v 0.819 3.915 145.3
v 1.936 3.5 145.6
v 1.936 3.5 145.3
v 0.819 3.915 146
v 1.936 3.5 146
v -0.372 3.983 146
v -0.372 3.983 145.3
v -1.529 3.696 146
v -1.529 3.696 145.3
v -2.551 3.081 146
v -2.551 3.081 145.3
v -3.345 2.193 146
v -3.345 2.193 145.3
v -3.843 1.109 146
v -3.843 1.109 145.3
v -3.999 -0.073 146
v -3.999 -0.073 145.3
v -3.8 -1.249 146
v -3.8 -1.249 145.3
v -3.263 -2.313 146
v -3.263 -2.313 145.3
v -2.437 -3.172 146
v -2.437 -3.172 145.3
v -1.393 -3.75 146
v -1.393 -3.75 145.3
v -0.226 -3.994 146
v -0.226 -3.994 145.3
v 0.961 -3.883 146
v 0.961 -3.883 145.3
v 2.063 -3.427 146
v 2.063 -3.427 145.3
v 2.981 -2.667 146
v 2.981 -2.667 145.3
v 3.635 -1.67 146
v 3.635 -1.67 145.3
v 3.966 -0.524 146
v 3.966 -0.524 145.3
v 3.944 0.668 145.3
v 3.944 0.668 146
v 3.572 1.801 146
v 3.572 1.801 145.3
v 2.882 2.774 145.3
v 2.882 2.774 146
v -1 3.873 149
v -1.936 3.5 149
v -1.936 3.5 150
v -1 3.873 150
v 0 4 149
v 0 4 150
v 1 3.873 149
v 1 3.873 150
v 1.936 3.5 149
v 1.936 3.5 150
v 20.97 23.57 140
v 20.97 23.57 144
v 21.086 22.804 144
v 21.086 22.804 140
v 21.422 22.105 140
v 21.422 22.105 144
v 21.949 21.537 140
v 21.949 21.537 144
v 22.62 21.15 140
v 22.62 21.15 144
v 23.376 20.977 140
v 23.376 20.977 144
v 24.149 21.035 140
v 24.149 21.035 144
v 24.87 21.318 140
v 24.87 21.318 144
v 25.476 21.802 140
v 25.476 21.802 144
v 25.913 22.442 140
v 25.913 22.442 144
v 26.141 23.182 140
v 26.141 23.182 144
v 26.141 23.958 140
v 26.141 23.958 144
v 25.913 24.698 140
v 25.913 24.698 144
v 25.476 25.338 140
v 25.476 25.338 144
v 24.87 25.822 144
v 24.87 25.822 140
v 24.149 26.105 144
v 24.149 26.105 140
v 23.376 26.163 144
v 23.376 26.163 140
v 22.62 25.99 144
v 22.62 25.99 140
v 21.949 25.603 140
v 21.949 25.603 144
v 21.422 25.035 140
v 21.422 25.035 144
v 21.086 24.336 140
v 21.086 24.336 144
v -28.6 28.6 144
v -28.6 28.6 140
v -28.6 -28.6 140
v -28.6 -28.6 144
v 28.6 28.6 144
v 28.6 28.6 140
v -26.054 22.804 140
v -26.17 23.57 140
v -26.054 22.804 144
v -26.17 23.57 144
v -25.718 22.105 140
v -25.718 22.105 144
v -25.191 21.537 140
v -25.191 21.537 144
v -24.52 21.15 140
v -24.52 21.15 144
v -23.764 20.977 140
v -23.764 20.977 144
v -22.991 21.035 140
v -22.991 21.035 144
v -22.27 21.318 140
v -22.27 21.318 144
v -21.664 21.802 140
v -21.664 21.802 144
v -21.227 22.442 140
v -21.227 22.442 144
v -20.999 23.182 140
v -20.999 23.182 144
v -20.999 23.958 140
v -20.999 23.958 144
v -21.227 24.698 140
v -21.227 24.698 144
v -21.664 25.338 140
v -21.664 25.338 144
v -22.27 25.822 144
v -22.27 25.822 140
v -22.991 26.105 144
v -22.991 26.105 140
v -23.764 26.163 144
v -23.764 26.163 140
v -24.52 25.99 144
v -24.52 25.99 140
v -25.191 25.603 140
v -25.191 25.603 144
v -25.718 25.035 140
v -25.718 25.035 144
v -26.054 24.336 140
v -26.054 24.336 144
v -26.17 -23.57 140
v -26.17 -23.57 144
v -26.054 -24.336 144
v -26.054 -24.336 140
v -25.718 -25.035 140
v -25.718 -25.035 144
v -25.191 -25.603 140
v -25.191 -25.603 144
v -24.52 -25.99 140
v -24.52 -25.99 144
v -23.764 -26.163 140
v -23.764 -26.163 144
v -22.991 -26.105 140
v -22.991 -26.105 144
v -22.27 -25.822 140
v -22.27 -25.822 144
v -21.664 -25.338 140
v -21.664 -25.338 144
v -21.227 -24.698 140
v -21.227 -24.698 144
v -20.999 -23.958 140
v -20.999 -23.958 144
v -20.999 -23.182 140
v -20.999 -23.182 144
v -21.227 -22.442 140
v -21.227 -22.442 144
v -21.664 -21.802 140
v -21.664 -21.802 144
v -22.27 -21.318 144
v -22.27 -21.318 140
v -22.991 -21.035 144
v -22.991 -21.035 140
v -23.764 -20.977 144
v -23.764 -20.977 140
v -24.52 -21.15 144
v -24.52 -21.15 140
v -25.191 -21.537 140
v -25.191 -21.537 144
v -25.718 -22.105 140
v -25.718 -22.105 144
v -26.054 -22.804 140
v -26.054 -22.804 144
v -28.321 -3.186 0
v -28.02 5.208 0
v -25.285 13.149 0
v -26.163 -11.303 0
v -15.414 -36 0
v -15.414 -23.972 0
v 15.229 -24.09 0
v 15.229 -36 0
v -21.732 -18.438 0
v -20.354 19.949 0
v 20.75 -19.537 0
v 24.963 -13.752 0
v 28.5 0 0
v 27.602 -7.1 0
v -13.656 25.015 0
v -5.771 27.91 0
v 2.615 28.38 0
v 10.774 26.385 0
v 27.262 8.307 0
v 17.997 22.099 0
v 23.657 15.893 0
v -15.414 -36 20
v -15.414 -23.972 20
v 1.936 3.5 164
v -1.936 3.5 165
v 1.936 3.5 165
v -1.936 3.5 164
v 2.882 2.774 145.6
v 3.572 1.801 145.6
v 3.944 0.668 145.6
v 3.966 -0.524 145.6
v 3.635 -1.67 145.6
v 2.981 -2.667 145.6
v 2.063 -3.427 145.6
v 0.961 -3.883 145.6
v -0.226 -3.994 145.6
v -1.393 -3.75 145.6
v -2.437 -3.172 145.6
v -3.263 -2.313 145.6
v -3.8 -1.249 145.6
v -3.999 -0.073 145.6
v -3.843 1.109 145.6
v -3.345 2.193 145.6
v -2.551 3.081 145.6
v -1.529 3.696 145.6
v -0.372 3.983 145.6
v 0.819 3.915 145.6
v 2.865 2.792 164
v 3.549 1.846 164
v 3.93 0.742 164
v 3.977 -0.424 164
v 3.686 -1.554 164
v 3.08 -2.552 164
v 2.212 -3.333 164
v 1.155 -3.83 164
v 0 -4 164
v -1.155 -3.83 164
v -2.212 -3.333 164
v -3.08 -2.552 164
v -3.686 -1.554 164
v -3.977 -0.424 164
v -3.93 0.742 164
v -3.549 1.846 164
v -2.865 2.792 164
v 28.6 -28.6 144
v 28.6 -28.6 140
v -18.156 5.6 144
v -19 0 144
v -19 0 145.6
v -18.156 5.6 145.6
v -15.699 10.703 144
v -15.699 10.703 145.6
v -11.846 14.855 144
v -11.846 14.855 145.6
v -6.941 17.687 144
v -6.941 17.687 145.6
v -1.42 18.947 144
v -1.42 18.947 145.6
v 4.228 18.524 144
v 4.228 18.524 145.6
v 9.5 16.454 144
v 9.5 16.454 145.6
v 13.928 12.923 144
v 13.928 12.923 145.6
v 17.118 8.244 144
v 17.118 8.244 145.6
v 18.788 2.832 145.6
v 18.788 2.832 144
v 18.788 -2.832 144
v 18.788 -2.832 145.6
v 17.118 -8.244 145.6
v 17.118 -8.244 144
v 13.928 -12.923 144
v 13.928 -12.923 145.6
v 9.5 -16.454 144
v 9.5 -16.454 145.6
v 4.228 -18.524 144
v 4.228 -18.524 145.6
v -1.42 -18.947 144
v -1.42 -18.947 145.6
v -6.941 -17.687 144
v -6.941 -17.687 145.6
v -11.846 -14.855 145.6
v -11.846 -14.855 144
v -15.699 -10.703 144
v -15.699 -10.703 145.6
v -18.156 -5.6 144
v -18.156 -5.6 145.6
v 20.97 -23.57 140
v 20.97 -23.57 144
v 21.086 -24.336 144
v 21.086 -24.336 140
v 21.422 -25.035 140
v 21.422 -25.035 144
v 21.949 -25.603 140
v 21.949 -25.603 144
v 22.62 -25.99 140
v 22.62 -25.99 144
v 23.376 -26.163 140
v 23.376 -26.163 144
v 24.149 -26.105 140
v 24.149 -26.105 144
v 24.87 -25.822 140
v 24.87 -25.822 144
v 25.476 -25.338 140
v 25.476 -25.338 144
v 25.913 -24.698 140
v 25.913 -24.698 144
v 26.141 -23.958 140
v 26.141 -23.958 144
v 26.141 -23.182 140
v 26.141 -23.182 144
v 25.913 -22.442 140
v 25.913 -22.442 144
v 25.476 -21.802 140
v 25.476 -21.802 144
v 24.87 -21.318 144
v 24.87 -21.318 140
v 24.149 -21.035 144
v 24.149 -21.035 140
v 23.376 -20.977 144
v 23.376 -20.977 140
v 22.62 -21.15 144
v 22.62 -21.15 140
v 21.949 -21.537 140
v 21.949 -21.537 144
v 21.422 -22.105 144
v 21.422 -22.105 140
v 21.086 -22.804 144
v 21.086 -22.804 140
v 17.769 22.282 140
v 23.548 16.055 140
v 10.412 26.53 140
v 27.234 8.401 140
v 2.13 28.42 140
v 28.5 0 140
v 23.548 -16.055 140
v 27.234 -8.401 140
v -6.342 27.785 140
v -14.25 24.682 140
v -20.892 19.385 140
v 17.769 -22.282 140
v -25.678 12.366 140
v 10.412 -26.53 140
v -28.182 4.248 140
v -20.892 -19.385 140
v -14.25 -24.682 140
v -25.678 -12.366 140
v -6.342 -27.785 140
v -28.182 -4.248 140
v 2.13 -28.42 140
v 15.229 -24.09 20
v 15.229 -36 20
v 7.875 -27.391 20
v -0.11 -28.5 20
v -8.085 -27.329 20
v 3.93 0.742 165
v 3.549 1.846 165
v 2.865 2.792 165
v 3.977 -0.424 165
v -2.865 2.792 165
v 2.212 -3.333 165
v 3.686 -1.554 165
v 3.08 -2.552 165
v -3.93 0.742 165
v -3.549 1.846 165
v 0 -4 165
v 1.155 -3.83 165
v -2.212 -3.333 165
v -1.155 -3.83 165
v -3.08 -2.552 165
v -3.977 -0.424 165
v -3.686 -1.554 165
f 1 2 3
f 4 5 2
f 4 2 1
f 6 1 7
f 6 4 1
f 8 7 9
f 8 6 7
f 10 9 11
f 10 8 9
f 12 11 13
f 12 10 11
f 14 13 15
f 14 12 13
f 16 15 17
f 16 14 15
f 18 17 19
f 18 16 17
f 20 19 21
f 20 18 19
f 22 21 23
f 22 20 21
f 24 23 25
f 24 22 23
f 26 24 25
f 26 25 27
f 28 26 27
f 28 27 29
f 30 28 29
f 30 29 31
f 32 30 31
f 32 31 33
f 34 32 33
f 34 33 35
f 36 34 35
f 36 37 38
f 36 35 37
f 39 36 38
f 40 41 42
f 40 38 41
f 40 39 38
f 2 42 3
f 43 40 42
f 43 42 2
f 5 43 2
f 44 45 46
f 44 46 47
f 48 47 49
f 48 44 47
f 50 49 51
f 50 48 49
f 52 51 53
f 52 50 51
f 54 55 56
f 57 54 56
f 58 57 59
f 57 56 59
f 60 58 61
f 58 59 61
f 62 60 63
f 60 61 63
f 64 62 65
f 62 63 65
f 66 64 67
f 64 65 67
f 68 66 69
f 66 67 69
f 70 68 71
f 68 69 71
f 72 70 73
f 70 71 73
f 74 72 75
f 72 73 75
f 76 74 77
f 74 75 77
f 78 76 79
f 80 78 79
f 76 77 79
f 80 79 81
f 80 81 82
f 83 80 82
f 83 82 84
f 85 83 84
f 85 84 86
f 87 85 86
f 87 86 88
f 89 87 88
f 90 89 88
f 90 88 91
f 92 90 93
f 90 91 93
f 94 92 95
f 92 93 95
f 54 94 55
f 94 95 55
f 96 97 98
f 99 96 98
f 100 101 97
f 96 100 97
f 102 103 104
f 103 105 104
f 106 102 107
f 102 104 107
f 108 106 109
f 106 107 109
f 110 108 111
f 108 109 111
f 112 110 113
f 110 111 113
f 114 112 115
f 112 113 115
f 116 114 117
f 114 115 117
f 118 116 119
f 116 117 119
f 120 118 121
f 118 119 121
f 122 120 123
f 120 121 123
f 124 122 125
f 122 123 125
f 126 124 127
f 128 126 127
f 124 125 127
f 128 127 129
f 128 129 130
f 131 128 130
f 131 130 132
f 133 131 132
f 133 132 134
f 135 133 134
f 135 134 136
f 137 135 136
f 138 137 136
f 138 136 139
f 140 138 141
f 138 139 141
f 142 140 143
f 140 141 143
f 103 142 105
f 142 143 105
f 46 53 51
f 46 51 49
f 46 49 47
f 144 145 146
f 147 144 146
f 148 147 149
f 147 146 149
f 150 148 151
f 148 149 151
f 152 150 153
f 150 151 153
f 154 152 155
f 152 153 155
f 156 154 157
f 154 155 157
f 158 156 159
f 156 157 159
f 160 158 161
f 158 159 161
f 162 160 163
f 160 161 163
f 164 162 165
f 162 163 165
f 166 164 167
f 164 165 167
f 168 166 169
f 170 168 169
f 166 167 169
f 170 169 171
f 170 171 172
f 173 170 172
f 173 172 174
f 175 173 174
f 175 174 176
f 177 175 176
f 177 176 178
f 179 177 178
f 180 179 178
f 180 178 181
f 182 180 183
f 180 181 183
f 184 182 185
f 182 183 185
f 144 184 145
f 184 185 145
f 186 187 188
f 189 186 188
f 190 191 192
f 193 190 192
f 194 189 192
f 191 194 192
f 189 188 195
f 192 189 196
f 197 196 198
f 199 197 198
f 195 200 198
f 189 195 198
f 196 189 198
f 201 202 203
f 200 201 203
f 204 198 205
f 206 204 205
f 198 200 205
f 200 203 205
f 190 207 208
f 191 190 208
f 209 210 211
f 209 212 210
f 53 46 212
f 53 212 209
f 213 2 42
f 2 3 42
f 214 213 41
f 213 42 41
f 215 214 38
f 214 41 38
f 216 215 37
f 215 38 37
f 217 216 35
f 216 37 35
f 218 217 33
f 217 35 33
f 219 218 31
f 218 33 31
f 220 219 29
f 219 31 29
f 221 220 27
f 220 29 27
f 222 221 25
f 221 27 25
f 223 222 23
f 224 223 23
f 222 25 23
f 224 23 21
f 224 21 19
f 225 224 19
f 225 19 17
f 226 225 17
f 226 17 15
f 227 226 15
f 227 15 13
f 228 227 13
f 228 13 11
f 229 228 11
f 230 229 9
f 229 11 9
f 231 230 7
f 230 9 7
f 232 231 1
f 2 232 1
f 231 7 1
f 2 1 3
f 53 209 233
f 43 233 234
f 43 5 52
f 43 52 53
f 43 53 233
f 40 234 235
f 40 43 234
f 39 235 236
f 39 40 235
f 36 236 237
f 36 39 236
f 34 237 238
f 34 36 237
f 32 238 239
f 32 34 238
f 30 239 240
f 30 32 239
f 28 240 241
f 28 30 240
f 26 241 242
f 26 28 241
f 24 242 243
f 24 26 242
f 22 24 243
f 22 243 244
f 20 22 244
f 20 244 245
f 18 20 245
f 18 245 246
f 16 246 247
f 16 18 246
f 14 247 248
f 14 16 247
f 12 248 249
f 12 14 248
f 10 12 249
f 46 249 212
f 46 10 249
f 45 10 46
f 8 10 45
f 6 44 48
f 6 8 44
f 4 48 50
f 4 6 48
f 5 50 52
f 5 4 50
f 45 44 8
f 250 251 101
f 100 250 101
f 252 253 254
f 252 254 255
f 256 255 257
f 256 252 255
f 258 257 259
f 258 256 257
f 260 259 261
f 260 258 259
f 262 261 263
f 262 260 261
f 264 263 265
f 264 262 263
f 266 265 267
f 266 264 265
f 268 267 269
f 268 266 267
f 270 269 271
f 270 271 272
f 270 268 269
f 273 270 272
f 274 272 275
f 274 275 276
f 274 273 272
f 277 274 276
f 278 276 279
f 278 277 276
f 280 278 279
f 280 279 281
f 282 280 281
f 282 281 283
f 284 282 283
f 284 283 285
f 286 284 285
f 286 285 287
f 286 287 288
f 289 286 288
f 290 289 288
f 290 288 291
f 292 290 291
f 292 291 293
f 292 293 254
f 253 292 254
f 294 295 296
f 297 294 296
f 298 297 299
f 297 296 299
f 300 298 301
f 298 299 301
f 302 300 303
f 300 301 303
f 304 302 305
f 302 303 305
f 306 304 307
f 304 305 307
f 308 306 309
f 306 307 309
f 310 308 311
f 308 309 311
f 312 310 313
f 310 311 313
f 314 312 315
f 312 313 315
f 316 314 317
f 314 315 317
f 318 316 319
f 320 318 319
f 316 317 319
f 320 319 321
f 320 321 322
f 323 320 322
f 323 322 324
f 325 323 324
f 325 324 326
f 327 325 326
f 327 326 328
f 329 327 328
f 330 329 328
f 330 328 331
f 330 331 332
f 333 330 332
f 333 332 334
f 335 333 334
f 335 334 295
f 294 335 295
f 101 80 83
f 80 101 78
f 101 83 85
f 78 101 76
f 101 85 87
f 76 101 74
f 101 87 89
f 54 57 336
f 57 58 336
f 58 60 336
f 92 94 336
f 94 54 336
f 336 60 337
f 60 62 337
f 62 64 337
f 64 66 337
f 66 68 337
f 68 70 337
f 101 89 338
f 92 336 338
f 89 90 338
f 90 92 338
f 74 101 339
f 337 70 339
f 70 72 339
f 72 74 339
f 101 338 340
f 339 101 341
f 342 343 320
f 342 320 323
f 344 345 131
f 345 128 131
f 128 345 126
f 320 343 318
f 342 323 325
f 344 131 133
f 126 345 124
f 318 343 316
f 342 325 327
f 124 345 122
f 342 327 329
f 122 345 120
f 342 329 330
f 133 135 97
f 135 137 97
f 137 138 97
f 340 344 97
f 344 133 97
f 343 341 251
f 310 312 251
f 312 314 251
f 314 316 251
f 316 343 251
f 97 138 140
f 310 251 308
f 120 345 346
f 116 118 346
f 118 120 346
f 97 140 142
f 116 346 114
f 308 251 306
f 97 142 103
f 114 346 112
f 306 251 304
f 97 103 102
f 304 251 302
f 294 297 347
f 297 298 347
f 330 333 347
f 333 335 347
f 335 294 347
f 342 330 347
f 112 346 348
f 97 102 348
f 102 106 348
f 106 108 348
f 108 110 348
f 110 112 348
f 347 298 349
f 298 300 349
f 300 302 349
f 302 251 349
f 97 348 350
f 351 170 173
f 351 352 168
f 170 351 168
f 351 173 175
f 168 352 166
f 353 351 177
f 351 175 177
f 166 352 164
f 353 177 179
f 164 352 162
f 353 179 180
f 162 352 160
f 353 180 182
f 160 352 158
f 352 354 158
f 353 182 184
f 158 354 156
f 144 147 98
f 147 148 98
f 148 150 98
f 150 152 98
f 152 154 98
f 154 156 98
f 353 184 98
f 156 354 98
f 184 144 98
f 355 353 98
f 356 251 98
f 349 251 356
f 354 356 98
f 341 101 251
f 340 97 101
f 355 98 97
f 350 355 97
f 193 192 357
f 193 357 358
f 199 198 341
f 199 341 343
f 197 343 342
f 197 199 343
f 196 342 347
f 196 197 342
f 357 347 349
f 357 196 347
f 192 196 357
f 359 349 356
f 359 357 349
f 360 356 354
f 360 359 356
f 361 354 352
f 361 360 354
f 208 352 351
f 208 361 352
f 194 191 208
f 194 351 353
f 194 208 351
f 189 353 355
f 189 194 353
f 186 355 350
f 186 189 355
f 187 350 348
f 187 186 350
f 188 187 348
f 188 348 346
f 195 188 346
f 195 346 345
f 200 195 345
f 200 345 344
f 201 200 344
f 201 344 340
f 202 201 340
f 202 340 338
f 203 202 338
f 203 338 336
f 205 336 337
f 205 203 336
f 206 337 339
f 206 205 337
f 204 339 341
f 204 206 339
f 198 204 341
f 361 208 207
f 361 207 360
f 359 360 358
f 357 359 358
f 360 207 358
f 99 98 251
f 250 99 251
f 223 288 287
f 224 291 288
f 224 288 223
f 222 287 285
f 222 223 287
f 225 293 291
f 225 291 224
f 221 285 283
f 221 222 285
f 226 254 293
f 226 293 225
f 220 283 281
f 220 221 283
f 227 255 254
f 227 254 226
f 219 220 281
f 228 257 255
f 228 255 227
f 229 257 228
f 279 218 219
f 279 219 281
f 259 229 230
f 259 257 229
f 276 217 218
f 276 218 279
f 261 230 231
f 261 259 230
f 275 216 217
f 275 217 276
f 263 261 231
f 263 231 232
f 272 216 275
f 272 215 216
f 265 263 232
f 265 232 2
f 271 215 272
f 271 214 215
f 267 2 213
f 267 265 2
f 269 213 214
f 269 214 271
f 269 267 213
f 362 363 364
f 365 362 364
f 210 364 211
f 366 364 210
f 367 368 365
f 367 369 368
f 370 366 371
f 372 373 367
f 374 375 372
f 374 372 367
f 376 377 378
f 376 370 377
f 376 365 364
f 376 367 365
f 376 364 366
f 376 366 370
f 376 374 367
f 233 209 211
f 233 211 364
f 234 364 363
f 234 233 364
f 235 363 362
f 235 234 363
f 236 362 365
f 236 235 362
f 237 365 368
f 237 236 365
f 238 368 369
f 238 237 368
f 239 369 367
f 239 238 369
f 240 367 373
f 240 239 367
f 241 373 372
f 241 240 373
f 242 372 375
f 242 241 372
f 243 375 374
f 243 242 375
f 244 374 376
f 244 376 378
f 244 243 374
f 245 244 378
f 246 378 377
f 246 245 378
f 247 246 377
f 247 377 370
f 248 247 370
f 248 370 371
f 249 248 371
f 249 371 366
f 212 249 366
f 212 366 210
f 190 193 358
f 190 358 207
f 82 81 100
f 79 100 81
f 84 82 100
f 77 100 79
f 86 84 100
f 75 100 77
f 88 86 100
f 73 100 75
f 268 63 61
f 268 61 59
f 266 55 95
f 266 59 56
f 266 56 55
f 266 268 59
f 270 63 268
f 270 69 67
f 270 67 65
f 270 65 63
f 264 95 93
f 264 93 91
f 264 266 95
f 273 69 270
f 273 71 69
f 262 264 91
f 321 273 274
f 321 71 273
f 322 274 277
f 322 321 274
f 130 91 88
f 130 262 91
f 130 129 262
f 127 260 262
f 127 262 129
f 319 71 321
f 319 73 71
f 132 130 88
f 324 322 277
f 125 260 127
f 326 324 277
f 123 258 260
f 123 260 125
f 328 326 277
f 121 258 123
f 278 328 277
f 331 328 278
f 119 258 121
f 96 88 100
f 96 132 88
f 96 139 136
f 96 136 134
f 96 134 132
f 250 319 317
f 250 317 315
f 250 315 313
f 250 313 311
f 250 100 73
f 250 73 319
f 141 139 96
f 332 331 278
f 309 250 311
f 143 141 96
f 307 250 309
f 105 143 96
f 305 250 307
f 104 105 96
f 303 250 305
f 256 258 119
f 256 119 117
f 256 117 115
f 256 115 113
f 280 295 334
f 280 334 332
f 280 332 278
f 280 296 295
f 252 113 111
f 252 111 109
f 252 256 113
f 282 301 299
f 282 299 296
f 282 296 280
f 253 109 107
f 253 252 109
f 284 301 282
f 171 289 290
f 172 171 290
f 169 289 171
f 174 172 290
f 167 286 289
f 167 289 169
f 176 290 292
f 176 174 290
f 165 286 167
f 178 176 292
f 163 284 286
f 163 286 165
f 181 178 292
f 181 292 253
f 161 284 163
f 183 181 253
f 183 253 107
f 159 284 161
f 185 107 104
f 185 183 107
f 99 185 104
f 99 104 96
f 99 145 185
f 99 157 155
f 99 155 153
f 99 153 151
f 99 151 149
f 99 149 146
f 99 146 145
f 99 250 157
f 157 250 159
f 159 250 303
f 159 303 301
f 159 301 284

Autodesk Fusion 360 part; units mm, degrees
sketch "Sketch5" plane through (0, 0, 0) normal (0, 0, 1) x (1, 0, 0)
  circle A0 centre (0, 0) radius 28.5
  dimension "d16" = 57
extrude "Extrude5" add sketch "Sketch5" along normal blind 140
sketch "Sketch6" plane through (0, 0, 0) normal (0, 0, -1) x (1, 0, 0)
  circle A0 centre (0, 0) radius 28.5
  line L0 (0, 0) -> (0, 36)
  line L1 (0, 36) -> (-15.414, 36)
  line L2 (-15.414, 36) -> (-15.414, 23.972)
  line L3 (-15.414, 23.972) -> (0, 23.972)
  line L4 (0, 23.972) -> (0, 36)
  line L5 (-15.414, 23.972) -> (15.229, 23.972)
  line L6 (15.229, 23.972) -> (15.229, 36)
  line L7 (15.229, 36) -> (-15.414, 36)
  line L8 (-15.414, 36) -> (-15.414, 23.972)
  dimension "d19" = 36
extrude "Extrude6" add sketch "Sketch6" against normal blind 20 contours A0 L0 L1 L2 L4 L7 L8 | A0 L0 L4 L6 L7
sketch "Sketch7" plane through (0, 0, 140) normal (0, 0, 1) x (-1, 0, 0)
  circle A0 centre (0, 0) radius 28.5
  circle A1 centre (0, 0) radius 12.7
  dimension "d22" = 25.4
extrude "Extrude7" add sketch "Sketch7" along normal blind 2 contours A1
sketch "Sketch8" plane through (0, 0, 142) normal (0, 0, 1) x (-1, 0, 0)
  circle A0 centre (0, 0) radius 12.7
  circle A1 centre (0, 0) radius 4
  dimension "d25" = 8
extrude "Extrude8" add sketch "Sketch8" along normal blind 33 contours A1
sketch "Sketch9" plane through (0, 0, 175) normal (0, 0, 1) x (-1, 0, 0)
  circle A0 centre (0, 0) radius 4
  line L0 (0, 0) -> (0, 4)
  line L1 (0, 4) -> (0, -3.5)
  line L2 (0, -3.5) -> (1.9365, -3.5)
  line L3 (-1.9365, -3.5) -> (0.1996, -3.5)
  dimension "d28" = 7.5
extrude "Extrude9" cut sketch "Sketch9" against normal blind 33 contours A0 L2 L3
sketch "Sketch10" plane through (0, 0, 140) normal (0, 0, 1) x (-1, 0, 0)
  circle A0 centre (0, 0) radius 12.7
  circle A1 centre (0, 0) radius 28.5
  circle A2 centre (0, 0) radius 19.44
  line L0 (0, 0) -> (-13.7462, 13.7462)
  line L1 (0, 0) -> (19.44, 0) construction
  line L2 (-13.7462, 13.7462) -> (13.7462, -13.7462)
  line L3 (0, 0) -> (-13.7462, -13.7462)
  line L4 (0, 0) -> (13.7462, 13.7462)
  dimension "d31" = 38.88
  dimension "d32" = 135
extrude "Extrude10" cut 1 faces at (-0.3164, 6.5548, 142) along direction (0, 0, -1) blind 2
extrude "Extrude11" cut 1 faces at (0, 1, 175) along direction (0, 0, -1) blind 11
sketch "Sketch11" plane through (0, 0, 140) normal (0, 0, 1) x (-1, 0, 0)
  arc A0 (1.9365, -3.5) -> (-1.9365, -3.5) centre (0, 0) ccw
  line L0 (1.9365, -3.5) -> (-1.9365, -3.5)
  circle A1 centre (0, 0) radius 28.5
  circle A2 centre (0, 0) radius 4
  line L1 (-1.9365, -3.5) -> (1.9365, -3.5)
extrude "Extrude12" add sketch "Sketch11" along normal blind 9 contours L0 A2 L1
sketch "Sketch12" plane through (0, 0, 140) normal (0, 0, 1) x (-1, 0, 0)
  circle A0 centre (0, 0) radius 28.5
  circle A1 centre (0, 0) radius 4
  line L0 (0, 0) -> (-28.6, 0)
  line L1 (-28.6, 0) -> (-28.6, -28.6)
  line L2 (-28.6, -28.6) -> (0, -28.6)
  line L3 (0, -28.6) -> (0, 0)
  line L4 (-28.6, -28.6) -> (28.6, -28.6)
  line L5 (28.6, -28.6) -> (28.6, 28.6)
  line L6 (28.6, 28.6) -> (-28.6, 28.6)
  line L7 (-28.6, 28.6) -> (-28.6, -28.6)
  circle A2 centre (0, 0) radius 19
  dimension "d42" = 28.6
  dimension "d43" = 28.6
  dimension "d44" = 57.2
  dimension "d45" = 57.2
  dimension "d46" = 38
extrude "Extrude13" add sketch "Sketch12" along normal blind 4 contours A0 L0 L3 A2 | A0 L0 L3 L4 L5 L6 L7 | A0 L0 L3 A2 | A0 L0 L1 L2 L3 L4 L7
sketch "Sketch13" plane through (0, 0, 144) normal (0, 0, 1) x (-1, 0, 0)
  circle A0 centre (0, 0) radius 19
  line L0 (-28.6, 28.6) -> (-28.6, -28.6)
  line L1 (-28.6, -28.6) -> (28.6, -28.6)
  line L2 (28.6, -28.6) -> (28.6, 28.6)
  line L3 (28.6, 28.6) -> (-28.6, 28.6)
  line L4 (0, 0) -> (23.57, 0)
  line L5 (23.57, 0) -> (23.57, -23.57)
  line L6 (23.57, -23.57) -> (0, -23.57)
  line L7 (0, -23.57) -> (0, 0)
  line L8 (23.57, -23.57) -> (-23.57, -23.57)
  line L9 (-23.57, -23.57) -> (-23.57, 23.57)
  line L10 (-23.57, 23.57) -> (23.57, 23.57)
  line L11 (23.57, 23.57) -> (23.57, -23.57)
  circle A1 centre (23.57, -23.57) radius 2.6
  circle A2 centre (23.57, 23.57) radius 2.6
  circle A3 centre (-23.57, 23.57) radius 2.6
  circle A4 centre (-23.57, -23.57) radius 2.6
  dimension "d49" = 23.57
  dimension "d50" = 23.57
  dimension "d51" = 47.14
  dimension "d52" = 47.14
  dimension "d53" = 5.2
  dimension "d54" = 5.2
  dimension "d55" = 5.2
  dimension "d56" = 5.2
extrude "Extrude14" cut sketch "Sketch13" against normal blind 12 contours L5 L6 L8 L11 A1 | L5 L6 L8 L11 A1 | L10 L11 A2 | L10 L11 A2 | L8 L9 A4 | L8 L9 A4 | L9 L10 A3 | L9 L10 A3
extrude "Extrude15" add 1 faces at (0, -13.9646, 140) along direction (0, 0, 1) blind 6
extrude "Extrude16" cut 1 faces at (-13.9178, 1.1186, 146) along direction (0, 0, -1) blind 0.7
extrude "Extrude17" add 1 faces at (-13.9178, 1.1186, 145.3) along direction (0, 0, 1) blind 0.3
extrude "Extrude18" add 1 faces at (0, 1, 164) along direction (0, 0, 1) blind 1
extrude "Extrude19" add 1 faces at (-0.4709, 3.5807, 149) along direction (0, 0, 1) blind 1
equation "d42 = ( 57.2 / 2 ) * 1 mm"
equation "d43 = ( 57.2 / 2 ) * 1 mm"
equation "d49 = ( 47.14 / 2 ) * 1 mm"
equation "d50 = ( 47.14 / 2 ) * 1 mm"
